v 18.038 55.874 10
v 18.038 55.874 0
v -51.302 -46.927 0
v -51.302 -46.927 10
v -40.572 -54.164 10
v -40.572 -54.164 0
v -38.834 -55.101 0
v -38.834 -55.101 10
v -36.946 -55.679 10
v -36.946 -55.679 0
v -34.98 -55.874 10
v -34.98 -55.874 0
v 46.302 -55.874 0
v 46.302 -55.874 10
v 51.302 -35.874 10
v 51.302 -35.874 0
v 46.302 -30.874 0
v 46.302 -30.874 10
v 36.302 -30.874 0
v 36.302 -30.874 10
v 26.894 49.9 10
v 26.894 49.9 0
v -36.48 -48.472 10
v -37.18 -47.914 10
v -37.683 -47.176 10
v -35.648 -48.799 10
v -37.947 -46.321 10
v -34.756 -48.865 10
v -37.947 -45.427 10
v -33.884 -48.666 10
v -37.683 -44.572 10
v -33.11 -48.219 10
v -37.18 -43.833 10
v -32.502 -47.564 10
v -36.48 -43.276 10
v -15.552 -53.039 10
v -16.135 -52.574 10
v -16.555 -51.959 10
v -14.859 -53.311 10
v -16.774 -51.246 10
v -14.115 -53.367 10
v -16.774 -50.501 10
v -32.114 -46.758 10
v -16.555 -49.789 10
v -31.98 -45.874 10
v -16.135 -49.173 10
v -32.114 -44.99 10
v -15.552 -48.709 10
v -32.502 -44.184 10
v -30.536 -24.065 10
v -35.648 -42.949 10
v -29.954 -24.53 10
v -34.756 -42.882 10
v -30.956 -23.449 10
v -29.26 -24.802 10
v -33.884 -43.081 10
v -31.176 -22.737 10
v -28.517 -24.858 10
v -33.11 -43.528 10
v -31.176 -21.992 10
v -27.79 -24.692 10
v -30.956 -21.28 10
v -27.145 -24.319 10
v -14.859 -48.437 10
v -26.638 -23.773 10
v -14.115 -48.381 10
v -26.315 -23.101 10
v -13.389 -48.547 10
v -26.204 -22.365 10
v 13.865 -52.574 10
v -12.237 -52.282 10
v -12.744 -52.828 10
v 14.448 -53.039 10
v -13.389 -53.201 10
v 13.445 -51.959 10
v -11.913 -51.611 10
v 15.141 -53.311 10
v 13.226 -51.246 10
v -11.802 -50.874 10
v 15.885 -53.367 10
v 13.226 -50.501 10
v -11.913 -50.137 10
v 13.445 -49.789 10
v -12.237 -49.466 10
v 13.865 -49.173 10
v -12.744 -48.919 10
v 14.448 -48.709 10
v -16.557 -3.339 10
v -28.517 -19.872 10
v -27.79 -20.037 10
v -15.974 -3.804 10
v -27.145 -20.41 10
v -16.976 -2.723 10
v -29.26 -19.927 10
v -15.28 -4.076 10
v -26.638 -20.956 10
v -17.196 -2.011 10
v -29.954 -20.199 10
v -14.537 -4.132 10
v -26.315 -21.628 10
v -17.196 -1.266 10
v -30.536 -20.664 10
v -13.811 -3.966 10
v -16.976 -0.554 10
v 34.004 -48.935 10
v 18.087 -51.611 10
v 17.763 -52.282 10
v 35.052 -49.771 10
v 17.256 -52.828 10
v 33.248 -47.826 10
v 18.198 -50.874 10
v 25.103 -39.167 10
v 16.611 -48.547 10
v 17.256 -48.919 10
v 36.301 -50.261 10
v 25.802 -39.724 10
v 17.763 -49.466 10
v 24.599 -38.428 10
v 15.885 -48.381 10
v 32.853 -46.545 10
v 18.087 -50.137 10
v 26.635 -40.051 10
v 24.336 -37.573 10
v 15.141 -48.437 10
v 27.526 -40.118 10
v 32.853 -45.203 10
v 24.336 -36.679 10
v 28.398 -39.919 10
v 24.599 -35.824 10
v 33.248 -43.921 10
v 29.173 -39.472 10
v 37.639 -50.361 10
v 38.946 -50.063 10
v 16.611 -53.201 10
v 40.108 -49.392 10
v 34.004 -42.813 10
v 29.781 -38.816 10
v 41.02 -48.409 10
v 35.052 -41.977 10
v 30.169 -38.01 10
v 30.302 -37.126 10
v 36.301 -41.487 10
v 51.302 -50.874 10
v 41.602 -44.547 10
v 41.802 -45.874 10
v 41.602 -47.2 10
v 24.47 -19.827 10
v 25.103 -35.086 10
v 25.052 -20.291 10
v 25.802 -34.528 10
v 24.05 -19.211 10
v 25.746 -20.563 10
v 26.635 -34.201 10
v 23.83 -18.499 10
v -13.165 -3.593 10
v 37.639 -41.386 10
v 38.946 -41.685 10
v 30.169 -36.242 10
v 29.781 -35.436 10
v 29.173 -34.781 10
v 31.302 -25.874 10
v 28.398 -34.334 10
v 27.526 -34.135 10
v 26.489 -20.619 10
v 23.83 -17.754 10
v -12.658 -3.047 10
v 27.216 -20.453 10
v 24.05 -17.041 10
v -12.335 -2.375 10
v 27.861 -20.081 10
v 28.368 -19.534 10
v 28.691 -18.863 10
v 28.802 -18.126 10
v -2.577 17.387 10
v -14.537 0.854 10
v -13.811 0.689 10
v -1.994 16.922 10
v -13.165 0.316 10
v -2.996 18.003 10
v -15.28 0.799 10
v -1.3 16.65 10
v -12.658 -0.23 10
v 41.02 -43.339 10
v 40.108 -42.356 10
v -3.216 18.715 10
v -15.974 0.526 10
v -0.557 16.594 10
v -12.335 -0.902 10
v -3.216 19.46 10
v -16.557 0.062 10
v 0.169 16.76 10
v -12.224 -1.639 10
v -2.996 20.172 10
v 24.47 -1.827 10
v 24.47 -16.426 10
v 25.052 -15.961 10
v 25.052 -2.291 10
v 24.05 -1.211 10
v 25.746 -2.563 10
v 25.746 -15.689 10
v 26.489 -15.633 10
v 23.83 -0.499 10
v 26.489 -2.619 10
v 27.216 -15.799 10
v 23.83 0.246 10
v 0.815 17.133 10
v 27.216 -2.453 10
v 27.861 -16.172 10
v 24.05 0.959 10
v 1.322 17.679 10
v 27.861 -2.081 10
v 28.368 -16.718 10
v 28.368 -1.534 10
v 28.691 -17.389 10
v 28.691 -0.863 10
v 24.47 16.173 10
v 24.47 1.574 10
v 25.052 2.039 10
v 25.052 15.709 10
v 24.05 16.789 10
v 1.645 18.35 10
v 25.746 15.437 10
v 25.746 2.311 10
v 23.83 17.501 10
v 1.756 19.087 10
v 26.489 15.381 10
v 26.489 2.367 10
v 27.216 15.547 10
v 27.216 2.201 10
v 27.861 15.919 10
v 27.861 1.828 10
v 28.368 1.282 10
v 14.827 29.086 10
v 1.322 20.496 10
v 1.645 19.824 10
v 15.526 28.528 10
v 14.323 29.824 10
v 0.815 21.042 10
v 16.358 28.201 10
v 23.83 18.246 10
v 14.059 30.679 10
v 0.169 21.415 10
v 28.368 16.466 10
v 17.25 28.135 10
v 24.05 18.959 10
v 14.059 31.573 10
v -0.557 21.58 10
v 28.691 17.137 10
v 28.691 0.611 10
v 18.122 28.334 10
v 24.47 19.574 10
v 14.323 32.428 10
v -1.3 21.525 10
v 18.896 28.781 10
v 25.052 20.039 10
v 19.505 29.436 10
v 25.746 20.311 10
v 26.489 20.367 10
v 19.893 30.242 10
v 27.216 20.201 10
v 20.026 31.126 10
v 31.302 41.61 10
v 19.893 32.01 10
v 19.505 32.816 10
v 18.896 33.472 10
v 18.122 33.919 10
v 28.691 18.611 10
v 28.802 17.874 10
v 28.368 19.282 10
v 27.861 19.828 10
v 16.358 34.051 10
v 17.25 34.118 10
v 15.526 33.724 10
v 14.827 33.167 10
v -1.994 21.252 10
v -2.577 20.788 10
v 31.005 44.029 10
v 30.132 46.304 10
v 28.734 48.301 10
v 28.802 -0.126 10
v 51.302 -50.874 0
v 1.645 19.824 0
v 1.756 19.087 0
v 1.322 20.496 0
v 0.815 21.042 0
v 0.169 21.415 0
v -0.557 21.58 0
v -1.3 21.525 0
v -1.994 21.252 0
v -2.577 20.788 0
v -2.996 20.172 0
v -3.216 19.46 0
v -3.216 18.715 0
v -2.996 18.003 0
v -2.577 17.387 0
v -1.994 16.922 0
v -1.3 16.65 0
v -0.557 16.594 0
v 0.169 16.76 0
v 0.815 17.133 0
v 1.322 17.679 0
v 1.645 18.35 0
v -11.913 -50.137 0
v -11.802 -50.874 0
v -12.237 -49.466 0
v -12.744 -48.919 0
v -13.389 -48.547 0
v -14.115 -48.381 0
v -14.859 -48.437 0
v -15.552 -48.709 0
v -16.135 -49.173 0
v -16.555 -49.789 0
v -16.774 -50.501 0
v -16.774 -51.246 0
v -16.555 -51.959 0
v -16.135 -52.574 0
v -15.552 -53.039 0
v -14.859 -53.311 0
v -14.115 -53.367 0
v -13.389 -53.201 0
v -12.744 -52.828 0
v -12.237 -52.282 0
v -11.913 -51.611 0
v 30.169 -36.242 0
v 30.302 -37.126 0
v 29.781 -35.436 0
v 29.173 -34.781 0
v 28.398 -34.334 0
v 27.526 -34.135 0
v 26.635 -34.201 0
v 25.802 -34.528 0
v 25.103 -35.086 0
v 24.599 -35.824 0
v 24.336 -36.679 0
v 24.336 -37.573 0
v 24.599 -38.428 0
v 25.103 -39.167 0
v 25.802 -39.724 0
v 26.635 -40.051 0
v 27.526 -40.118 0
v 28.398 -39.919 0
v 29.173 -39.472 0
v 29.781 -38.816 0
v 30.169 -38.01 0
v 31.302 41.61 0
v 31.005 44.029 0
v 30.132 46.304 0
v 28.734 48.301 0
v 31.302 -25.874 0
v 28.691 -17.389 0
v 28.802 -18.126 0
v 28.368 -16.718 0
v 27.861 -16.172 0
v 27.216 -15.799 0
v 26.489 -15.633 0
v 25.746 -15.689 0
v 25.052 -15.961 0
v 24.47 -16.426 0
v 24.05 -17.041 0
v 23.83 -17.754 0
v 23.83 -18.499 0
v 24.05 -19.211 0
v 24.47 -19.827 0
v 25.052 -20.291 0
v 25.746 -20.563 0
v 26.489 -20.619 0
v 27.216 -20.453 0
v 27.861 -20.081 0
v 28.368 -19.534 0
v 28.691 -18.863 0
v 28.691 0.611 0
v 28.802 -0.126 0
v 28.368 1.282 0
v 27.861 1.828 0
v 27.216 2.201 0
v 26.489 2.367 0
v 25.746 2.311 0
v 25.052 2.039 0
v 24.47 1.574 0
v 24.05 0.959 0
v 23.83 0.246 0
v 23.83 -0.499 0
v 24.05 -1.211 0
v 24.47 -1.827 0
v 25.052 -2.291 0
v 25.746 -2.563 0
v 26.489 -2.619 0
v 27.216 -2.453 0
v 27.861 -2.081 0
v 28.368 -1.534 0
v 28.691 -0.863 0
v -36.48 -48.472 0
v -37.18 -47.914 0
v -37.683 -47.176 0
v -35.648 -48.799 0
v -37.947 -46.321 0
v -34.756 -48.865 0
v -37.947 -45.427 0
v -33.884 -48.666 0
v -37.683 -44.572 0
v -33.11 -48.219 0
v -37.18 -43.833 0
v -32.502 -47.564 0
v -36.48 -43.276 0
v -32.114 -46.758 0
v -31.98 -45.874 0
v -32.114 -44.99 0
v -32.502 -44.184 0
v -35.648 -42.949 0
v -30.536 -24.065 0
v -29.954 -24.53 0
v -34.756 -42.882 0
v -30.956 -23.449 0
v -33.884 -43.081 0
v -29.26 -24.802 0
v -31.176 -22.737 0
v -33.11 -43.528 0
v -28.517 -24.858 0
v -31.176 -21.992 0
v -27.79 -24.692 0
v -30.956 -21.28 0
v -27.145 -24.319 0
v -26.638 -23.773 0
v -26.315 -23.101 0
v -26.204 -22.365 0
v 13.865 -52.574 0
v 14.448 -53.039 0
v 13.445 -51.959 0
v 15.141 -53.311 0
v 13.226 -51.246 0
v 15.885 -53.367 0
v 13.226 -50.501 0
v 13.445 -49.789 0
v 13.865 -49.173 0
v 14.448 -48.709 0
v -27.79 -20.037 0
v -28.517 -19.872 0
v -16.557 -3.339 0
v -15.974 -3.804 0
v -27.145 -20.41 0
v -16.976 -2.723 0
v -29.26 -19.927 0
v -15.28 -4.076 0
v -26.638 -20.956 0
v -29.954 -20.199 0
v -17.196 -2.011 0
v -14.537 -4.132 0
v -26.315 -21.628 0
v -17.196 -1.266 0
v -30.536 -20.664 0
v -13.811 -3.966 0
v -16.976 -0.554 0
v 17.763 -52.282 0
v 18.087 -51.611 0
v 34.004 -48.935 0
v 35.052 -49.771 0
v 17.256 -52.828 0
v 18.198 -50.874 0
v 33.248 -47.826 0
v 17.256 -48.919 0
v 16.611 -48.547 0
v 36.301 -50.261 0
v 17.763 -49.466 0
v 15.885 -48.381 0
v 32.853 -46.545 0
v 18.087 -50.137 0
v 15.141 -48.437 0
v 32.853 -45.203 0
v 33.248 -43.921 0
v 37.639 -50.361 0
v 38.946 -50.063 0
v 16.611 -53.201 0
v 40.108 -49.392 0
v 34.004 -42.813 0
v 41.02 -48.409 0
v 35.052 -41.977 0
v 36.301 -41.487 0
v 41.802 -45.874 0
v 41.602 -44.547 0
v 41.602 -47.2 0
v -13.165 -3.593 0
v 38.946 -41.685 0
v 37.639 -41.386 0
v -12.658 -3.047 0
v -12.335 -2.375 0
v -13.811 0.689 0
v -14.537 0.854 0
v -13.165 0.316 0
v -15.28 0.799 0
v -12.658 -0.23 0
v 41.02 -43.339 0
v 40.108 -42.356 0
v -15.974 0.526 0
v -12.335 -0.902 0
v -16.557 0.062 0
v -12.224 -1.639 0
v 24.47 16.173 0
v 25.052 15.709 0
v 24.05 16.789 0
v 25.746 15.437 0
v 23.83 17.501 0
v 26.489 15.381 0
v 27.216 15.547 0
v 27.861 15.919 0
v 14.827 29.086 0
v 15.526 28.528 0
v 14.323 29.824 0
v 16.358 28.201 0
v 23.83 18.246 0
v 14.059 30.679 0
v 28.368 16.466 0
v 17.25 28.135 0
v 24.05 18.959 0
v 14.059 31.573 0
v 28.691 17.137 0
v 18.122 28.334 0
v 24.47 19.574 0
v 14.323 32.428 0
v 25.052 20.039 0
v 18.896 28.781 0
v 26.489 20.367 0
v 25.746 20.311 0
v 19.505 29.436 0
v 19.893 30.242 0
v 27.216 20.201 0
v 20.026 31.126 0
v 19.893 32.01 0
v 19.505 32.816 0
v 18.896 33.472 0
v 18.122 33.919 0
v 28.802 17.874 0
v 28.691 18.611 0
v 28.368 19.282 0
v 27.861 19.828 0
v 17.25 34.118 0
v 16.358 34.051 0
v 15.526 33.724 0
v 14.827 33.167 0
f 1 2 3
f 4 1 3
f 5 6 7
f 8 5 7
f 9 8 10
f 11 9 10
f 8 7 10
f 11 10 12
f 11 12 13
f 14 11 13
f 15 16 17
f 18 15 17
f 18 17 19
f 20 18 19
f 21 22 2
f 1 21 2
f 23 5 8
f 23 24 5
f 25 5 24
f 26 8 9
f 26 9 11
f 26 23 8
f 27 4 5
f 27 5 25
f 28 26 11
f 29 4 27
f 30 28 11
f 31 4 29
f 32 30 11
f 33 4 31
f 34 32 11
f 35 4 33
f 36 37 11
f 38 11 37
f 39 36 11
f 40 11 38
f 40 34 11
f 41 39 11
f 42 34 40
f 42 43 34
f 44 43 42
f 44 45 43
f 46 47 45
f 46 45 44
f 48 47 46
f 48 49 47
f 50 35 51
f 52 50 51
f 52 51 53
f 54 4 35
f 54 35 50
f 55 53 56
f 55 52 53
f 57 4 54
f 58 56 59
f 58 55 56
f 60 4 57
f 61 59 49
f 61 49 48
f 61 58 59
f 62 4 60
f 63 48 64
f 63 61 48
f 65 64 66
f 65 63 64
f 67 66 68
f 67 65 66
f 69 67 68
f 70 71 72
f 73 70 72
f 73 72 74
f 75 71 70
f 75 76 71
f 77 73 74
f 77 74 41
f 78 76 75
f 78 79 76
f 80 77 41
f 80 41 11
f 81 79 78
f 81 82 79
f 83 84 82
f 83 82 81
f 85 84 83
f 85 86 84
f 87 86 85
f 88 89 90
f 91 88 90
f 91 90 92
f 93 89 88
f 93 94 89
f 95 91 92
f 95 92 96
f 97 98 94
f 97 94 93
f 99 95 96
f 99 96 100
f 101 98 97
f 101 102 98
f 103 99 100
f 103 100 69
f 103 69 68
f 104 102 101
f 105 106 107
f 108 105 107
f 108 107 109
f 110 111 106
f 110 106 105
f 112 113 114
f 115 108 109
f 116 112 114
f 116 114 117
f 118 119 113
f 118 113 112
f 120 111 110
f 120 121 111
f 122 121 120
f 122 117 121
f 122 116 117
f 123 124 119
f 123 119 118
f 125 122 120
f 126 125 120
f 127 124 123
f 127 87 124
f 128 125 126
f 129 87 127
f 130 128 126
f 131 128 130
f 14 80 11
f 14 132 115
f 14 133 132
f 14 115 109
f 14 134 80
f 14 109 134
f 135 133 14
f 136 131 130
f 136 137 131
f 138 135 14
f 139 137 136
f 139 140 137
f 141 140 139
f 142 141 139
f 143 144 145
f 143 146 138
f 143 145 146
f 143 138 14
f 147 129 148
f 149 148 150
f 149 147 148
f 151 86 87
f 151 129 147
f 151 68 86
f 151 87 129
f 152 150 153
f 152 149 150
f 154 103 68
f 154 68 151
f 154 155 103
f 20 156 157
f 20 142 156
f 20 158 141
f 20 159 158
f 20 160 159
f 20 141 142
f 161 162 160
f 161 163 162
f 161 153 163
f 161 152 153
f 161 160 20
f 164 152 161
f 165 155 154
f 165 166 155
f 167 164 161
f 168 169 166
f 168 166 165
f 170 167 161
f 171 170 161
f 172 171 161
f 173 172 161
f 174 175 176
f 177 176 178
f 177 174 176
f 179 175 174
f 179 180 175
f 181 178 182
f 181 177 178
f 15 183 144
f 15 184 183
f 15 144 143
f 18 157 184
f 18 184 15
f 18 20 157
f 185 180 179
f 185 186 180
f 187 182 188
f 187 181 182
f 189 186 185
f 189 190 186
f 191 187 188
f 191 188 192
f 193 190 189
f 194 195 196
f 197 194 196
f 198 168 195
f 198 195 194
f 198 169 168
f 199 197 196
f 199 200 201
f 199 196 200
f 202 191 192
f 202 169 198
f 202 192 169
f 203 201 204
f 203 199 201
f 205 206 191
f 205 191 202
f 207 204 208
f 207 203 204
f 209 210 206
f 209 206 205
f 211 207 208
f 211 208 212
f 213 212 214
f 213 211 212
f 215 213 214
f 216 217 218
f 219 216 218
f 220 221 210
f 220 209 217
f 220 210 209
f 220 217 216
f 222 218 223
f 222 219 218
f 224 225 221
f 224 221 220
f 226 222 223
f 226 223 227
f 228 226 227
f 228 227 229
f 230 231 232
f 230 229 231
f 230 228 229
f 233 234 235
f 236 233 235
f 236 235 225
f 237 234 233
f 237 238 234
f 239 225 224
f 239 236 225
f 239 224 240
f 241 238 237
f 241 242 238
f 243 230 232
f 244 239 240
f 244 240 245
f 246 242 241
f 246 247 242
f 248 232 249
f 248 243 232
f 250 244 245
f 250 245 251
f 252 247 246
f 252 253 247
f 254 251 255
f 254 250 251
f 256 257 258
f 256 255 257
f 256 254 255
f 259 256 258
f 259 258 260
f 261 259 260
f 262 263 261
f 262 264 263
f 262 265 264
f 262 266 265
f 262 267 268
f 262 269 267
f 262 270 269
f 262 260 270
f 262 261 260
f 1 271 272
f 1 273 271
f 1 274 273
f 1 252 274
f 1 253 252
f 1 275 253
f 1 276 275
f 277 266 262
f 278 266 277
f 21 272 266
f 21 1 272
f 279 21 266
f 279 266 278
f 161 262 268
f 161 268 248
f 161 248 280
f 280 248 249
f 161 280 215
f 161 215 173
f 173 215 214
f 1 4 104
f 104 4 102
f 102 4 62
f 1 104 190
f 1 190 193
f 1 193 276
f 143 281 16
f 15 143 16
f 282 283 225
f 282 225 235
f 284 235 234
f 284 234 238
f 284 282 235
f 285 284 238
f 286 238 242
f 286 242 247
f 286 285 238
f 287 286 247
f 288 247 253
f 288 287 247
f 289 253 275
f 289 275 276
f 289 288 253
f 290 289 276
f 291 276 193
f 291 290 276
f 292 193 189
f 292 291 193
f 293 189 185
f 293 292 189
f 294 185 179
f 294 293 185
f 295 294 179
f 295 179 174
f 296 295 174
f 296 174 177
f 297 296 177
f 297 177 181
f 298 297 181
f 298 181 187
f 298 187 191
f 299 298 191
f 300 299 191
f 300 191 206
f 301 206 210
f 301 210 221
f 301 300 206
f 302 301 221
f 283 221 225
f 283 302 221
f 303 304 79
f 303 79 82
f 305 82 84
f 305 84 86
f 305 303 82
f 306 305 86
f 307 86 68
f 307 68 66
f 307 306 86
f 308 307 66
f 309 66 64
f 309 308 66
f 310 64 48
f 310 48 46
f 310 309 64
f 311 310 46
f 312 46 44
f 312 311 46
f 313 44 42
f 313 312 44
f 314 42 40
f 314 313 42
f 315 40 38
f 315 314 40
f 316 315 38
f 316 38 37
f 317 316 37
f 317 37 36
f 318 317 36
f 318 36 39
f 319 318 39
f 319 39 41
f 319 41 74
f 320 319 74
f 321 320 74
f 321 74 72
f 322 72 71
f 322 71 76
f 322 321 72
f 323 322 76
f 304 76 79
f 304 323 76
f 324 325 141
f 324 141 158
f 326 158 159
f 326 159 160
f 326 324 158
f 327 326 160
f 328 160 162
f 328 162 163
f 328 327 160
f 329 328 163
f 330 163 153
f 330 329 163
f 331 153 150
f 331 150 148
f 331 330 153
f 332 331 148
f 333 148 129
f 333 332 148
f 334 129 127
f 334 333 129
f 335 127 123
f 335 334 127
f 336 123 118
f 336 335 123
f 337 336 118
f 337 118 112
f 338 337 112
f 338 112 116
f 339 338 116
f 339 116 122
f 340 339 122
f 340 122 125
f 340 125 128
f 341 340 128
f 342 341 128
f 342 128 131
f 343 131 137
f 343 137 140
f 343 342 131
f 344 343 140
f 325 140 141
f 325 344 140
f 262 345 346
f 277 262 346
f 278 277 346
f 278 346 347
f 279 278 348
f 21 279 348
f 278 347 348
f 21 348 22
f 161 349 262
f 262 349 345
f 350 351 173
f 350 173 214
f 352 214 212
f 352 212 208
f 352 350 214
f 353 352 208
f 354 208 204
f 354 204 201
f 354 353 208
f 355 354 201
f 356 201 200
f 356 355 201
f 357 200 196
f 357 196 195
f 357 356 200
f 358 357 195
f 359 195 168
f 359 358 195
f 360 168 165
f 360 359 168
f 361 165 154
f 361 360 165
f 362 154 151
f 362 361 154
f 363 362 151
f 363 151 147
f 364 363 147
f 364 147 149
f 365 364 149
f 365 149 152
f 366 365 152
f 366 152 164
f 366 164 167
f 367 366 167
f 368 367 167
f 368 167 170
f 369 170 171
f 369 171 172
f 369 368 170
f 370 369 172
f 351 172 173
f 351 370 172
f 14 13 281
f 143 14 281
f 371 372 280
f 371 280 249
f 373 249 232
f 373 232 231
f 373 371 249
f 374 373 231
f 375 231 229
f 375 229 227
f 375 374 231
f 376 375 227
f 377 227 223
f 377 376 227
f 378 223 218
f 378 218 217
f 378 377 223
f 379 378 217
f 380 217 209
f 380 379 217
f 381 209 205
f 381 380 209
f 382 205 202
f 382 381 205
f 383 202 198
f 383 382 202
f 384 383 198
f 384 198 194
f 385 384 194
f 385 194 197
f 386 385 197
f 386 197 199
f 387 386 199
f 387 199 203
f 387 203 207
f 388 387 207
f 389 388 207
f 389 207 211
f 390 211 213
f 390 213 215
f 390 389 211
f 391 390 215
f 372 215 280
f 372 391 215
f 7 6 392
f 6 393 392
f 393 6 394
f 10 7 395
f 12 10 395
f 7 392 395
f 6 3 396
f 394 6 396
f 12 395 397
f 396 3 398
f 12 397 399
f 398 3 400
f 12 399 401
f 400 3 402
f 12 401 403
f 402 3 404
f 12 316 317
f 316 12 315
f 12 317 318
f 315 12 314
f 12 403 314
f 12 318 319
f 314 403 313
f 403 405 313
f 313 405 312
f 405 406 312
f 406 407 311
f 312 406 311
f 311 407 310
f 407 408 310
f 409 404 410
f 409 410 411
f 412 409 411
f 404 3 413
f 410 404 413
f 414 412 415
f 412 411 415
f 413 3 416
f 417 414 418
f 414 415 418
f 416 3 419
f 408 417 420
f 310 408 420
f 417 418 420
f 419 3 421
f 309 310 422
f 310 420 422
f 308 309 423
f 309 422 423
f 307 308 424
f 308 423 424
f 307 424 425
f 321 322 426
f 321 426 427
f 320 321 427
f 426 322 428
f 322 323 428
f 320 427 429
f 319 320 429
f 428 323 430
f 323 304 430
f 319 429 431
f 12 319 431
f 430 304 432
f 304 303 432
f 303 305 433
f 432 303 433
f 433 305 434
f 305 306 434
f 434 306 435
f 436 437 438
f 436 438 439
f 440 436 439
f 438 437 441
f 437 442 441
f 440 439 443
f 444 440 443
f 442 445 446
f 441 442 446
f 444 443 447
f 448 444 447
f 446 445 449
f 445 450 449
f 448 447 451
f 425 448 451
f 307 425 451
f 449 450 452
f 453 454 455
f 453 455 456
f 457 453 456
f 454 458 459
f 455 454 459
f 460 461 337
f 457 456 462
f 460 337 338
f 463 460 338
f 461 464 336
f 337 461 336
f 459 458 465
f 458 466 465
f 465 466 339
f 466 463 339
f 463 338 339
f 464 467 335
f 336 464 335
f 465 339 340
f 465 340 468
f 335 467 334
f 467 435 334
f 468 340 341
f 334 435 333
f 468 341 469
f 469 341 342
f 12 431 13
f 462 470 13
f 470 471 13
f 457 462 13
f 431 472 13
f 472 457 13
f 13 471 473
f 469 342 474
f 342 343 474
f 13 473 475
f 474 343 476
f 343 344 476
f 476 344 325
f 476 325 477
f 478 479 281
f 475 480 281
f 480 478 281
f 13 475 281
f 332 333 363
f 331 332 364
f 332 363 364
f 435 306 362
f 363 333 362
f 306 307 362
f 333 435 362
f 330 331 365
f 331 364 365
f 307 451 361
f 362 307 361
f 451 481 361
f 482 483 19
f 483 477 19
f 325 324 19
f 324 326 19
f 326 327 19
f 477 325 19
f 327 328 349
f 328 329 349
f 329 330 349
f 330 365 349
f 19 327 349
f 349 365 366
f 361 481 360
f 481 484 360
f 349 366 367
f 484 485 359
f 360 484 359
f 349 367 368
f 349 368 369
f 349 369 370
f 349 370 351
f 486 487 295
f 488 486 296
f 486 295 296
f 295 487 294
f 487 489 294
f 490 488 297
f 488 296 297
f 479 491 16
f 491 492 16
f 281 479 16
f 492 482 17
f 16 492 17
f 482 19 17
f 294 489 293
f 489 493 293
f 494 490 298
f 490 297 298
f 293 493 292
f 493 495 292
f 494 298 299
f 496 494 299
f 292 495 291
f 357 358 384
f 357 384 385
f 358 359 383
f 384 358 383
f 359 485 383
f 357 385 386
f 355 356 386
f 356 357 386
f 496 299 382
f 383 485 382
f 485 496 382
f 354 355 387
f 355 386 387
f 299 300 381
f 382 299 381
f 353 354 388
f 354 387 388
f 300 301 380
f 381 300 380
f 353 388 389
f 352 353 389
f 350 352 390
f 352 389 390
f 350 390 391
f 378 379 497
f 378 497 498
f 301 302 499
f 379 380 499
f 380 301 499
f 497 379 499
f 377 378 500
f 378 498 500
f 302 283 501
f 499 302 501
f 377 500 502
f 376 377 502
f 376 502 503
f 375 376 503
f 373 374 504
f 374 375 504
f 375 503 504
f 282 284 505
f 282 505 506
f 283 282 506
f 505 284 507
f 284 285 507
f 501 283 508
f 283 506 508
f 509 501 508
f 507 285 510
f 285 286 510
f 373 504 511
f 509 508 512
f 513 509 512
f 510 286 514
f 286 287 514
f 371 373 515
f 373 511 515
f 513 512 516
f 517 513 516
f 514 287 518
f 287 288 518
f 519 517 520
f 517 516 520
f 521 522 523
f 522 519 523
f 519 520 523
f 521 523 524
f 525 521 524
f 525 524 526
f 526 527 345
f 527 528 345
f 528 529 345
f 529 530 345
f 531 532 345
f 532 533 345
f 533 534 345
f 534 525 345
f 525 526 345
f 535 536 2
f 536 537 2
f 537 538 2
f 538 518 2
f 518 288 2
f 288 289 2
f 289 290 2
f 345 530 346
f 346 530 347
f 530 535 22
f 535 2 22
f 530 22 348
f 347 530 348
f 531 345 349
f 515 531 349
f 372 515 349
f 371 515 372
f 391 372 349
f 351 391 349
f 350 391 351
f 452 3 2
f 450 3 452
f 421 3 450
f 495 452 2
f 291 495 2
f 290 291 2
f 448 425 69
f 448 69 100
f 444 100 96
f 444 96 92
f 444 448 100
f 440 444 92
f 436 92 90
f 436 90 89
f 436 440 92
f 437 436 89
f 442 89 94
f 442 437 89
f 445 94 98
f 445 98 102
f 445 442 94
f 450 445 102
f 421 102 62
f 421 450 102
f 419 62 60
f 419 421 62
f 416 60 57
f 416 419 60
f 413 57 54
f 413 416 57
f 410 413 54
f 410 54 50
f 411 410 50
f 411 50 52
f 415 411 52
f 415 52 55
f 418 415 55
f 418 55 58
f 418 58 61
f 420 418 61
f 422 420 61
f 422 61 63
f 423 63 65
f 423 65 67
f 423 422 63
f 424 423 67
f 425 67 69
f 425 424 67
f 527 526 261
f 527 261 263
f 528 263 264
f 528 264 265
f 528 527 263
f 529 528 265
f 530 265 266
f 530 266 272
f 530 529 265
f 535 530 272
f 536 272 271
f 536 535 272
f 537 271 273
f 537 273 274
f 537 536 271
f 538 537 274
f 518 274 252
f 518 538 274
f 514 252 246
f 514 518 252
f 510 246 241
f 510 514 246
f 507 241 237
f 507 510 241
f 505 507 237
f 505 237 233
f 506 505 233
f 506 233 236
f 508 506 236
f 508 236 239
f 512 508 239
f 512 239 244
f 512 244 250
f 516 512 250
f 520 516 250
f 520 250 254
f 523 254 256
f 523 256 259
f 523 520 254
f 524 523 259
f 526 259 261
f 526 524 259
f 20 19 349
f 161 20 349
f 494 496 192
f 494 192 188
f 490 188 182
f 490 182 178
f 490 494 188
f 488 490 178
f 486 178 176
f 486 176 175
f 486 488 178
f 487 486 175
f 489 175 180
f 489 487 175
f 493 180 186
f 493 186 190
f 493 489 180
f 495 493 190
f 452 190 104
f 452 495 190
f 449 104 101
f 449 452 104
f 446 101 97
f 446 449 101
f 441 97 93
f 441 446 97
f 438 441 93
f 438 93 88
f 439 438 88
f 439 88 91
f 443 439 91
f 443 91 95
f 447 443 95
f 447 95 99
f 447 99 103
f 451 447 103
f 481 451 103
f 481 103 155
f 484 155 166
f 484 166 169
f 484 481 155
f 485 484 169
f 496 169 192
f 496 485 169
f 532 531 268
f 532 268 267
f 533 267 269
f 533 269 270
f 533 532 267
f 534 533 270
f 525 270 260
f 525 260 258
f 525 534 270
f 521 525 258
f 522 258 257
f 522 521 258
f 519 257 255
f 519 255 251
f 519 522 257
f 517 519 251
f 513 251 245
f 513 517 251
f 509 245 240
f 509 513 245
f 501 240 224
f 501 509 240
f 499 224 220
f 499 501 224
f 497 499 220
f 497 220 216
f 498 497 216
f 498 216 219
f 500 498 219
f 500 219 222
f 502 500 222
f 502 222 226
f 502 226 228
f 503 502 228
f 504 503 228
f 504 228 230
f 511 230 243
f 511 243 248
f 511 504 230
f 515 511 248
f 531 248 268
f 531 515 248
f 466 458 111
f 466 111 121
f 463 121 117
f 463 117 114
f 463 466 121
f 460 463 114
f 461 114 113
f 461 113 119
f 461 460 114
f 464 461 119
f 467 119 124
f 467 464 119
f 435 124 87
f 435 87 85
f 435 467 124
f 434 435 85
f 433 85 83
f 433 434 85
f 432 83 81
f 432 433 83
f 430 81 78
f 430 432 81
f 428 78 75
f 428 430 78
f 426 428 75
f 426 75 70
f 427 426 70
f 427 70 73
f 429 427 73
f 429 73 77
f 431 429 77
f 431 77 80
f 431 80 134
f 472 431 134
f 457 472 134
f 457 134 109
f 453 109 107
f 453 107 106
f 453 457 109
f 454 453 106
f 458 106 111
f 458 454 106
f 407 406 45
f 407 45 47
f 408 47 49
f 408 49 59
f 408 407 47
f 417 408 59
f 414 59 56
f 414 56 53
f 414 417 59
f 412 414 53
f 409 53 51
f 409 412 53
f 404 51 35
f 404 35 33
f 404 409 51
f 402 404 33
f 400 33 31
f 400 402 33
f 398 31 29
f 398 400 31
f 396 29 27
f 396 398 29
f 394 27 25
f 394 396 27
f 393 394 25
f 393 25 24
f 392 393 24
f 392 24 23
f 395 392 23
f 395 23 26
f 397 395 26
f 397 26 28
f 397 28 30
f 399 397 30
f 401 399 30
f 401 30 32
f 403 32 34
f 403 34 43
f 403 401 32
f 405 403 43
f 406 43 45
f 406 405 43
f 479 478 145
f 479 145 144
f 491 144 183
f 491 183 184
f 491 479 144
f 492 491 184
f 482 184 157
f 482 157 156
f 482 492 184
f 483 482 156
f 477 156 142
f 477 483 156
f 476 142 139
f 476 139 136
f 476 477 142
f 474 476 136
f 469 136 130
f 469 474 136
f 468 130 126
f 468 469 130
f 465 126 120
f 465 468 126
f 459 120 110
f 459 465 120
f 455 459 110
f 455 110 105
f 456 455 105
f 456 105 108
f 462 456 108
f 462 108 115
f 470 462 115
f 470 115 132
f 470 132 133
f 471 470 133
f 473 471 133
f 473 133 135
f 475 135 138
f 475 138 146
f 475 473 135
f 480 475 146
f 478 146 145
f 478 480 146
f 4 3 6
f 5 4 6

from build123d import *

# Parameters (mm, degrees)
SKETCH_2_R      = 3
SKETCH_2_R_2    = 2.5
SKETCH_2_R_3    = 4.5
EXTRUDE_1_DEPTH = 10


with BuildPart() as part:
    # Эскиз2 → Бобышка-Вытянуть1 (new body)
    with BuildSketch(Plane.XY):
        with BuildLine():
            Line((-34.98035262, -55.873872726), (46.302260596, -55.873872726))
            Line((46.302260596, -55.873872726), (51.302260596, -50.873872726))
            Line((51.302260596, -50.873872726), (51.302260596, -35.873872726))
            Line((51.302260596, -35.873872726), (46.302260596, -30.873872726))
            Line((46.302260596, -30.873872726), (36.302260596, -30.873872726))
            Line((36.302260596, -30.873872726), (31.302260596, -25.873872726))
            Line((31.302260596, -25.873872726), (31.302260596, 41.609691954))
            ThreePointArc((31.302260596, 41.609691954), (30.131736524, 46.304407582), (26.89418963, 49.90006768))
            Line((26.89418963, 49.90006768), (18.037659435, 55.873872726))
            Line((18.037659435, 55.873872726), (-51.302260596, -46.926786271))
            Line((-51.302260596, -46.926786271), (-40.572281655, -54.164248452))
            ThreePointArc((-40.572281655, -54.164248452), (-37.904069667, -55.436920286), (-34.98035262, -55.873872726))
        make_face()
        with Locations((27.302260596, -37.126127274)):
            Circle(SKETCH_2_R, mode=Mode.SUBTRACT)
        with Locations((17.025927685, 31.126127274)):
            Circle(SKETCH_2_R, mode=Mode.SUBTRACT)
        with Locations((-34.98035262, -45.873872726)):
            Circle(SKETCH_2_R, mode=Mode.SUBTRACT)
        with Locations((-28.703706918, -22.364510894)):
            Circle(SKETCH_2_R_2, mode=Mode.SUBTRACT)
        with Locations((-14.723884332, -1.63857158)):
            Circle(SKETCH_2_R_2, mode=Mode.SUBTRACT)
        with Locations((-0.744061745, 19.087367734)):
            Circle(SKETCH_2_R_2, mode=Mode.SUBTRACT)
        with Locations((-14.302260596, -50.873872726)):
            Circle(SKETCH_2_R_2, mode=Mode.SUBTRACT)
        with Locations((15.697739404, -50.873872726)):
            Circle(SKETCH_2_R_2, mode=Mode.SUBTRACT)
        with Locations((26.302260596, 17.873872726)):
            Circle(SKETCH_2_R_2, mode=Mode.SUBTRACT)
        with Locations((26.302260596, -0.126127274)):
            Circle(SKETCH_2_R_2, mode=Mode.SUBTRACT)
        with Locations((26.302260596, -18.126127274)):
            Circle(SKETCH_2_R_2, mode=Mode.SUBTRACT)
        with Locations((37.302260596, -45.873872726)):
            Circle(SKETCH_2_R_3, mode=Mode.SUBTRACT)
    extrude(amount=EXTRUDE_1_DEPTH)


solid = part.part
